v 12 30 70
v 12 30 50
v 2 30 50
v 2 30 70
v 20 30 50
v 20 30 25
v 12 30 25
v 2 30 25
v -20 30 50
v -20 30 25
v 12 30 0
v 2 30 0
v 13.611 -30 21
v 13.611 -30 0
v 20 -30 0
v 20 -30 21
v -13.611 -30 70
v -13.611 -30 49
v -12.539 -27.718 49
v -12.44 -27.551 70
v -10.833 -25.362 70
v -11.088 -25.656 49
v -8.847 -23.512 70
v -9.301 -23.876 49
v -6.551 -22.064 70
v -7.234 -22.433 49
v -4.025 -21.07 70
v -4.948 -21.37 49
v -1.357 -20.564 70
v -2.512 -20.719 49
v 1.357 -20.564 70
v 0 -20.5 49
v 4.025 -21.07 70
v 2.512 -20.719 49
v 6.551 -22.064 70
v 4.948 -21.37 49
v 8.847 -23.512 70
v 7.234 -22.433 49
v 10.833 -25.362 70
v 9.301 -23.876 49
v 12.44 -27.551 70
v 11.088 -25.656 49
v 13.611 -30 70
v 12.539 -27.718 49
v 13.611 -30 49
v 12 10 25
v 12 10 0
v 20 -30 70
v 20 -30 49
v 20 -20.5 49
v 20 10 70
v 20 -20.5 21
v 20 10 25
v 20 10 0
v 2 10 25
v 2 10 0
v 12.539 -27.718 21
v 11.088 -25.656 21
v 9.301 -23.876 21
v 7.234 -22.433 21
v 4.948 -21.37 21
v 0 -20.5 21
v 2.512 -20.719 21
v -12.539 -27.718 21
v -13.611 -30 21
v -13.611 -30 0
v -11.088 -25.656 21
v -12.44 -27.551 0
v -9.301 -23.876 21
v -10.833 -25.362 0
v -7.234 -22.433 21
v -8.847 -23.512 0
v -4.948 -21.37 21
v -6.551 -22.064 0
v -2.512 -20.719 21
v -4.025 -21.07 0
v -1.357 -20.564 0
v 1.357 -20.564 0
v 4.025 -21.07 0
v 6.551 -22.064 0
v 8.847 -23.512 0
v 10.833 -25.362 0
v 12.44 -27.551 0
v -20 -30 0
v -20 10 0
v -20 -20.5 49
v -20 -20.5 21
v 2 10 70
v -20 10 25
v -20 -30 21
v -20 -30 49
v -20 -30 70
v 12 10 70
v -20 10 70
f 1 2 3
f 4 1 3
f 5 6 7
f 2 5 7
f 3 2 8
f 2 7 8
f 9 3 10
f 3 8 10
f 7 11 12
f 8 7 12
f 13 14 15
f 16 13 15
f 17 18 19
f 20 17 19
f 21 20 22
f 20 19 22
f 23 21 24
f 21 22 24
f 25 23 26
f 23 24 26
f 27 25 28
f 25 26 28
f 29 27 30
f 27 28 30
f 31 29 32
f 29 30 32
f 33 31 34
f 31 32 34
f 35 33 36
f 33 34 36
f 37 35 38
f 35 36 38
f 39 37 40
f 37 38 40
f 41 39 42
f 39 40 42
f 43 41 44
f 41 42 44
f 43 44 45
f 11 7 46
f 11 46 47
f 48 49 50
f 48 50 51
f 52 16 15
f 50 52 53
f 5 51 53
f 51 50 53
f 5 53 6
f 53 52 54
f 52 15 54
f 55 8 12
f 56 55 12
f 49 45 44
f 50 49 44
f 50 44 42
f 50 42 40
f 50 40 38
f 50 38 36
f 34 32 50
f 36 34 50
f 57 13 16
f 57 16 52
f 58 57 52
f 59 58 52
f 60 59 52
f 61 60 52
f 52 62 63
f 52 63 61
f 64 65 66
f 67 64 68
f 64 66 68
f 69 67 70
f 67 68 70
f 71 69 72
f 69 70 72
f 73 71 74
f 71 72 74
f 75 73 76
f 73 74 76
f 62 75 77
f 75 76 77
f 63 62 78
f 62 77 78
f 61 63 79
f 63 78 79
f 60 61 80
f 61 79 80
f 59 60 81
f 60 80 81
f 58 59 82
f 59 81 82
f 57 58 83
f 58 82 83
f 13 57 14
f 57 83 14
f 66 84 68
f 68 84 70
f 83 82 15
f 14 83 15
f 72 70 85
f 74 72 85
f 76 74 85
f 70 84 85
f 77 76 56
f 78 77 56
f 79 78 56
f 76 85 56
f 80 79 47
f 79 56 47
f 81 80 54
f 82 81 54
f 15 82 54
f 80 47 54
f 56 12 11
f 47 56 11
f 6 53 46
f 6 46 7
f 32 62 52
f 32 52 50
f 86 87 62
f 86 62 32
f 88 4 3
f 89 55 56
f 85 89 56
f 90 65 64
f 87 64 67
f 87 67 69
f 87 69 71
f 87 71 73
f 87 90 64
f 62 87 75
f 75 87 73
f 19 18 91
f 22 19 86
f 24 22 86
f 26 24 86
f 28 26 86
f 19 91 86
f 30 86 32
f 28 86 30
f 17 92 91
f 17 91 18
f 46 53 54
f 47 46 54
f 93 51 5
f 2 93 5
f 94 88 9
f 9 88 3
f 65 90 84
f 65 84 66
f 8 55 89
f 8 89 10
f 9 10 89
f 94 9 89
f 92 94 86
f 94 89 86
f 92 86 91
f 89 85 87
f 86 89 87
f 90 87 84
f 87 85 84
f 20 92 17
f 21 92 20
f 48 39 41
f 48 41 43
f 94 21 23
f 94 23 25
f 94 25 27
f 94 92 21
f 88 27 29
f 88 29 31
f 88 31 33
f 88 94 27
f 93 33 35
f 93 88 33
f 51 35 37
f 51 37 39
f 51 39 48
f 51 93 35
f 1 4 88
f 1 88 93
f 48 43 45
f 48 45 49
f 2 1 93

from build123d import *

# Parameters (mm, degrees)
EXTRUDE_1_DEPTH     = 70
SKETCH_2_W          = 28
SKETCH_2_H          = 9.5
CUT_EXTRUDE_1_DEPTH = 87.02325267
SKETCH_3_W          = 25
SKETCH_3_H          = 20
CUT_EXTRUDE_2_DEPTH = 8
CUT_EXTRUDE_START   = -18
SKETCH_3_2_W        = 25
SKETCH_3_2_H        = 20
CUT_EXTRUDE_3_DEPTH = 69.02325267


with BuildPart() as part:
    # Эскиз1 → Бобышка-Вытянуть1 (new body)
    with BuildSketch(Plane.XY):
        with BuildLine():
            Line((-20, 30), (-20, -30))
            Line((-20, -30), (-13.610657589, -30))
            ThreePointArc((-13.610657589, -30), (0, -20.5), (13.610657589, -30))
            Line((13.610657589, -30), (20, -30))
            Line((20, -30), (20, 30))
            Line((20, 30), (-20, 30))
        make_face()
    extrude(amount=EXTRUDE_1_DEPTH)

    # Эскиз2 → Вырез-Вытянуть1 (cut, through all)
    with BuildSketch(Plane.ZY.offset(20)):
        with Locations((35, -25.25)):
            Rectangle(SKETCH_2_W, SKETCH_2_H)
    extrude(amount=-CUT_EXTRUDE_1_DEPTH, mode=Mode.SUBTRACT)

    # Эскиз3 → Вырез-Вытянуть2 (cut)
    with BuildSketch(Plane(origin=(20, 0, 0), x_dir=(0, 0, -1), z_dir=(1, 0, 0))):
        Polygon((-70, 30), (-70, 10), (-50, 30), align=None)
        with Locations((-12.5, 20)):
            Rectangle(SKETCH_3_W, SKETCH_3_H)
    extrude(amount=-CUT_EXTRUDE_2_DEPTH, mode=Mode.SUBTRACT)

    # Эскиз3<2> → Вырез-Вытянуть3 (cut, through all)
    with BuildSketch(Plane(origin=(20, 0, 0), x_dir=(0, 0, -1), z_dir=(1, 0, 0)).offset(CUT_EXTRUDE_START)):
        Polygon((-70, 30), (-70, 10), (-50, 30), align=None)
        with Locations((-12.5, 20)):
            Rectangle(SKETCH_3_2_W, SKETCH_3_2_H)
    extrude(amount=-CUT_EXTRUDE_3_DEPTH, mode=Mode.SUBTRACT)


solid = part.part
